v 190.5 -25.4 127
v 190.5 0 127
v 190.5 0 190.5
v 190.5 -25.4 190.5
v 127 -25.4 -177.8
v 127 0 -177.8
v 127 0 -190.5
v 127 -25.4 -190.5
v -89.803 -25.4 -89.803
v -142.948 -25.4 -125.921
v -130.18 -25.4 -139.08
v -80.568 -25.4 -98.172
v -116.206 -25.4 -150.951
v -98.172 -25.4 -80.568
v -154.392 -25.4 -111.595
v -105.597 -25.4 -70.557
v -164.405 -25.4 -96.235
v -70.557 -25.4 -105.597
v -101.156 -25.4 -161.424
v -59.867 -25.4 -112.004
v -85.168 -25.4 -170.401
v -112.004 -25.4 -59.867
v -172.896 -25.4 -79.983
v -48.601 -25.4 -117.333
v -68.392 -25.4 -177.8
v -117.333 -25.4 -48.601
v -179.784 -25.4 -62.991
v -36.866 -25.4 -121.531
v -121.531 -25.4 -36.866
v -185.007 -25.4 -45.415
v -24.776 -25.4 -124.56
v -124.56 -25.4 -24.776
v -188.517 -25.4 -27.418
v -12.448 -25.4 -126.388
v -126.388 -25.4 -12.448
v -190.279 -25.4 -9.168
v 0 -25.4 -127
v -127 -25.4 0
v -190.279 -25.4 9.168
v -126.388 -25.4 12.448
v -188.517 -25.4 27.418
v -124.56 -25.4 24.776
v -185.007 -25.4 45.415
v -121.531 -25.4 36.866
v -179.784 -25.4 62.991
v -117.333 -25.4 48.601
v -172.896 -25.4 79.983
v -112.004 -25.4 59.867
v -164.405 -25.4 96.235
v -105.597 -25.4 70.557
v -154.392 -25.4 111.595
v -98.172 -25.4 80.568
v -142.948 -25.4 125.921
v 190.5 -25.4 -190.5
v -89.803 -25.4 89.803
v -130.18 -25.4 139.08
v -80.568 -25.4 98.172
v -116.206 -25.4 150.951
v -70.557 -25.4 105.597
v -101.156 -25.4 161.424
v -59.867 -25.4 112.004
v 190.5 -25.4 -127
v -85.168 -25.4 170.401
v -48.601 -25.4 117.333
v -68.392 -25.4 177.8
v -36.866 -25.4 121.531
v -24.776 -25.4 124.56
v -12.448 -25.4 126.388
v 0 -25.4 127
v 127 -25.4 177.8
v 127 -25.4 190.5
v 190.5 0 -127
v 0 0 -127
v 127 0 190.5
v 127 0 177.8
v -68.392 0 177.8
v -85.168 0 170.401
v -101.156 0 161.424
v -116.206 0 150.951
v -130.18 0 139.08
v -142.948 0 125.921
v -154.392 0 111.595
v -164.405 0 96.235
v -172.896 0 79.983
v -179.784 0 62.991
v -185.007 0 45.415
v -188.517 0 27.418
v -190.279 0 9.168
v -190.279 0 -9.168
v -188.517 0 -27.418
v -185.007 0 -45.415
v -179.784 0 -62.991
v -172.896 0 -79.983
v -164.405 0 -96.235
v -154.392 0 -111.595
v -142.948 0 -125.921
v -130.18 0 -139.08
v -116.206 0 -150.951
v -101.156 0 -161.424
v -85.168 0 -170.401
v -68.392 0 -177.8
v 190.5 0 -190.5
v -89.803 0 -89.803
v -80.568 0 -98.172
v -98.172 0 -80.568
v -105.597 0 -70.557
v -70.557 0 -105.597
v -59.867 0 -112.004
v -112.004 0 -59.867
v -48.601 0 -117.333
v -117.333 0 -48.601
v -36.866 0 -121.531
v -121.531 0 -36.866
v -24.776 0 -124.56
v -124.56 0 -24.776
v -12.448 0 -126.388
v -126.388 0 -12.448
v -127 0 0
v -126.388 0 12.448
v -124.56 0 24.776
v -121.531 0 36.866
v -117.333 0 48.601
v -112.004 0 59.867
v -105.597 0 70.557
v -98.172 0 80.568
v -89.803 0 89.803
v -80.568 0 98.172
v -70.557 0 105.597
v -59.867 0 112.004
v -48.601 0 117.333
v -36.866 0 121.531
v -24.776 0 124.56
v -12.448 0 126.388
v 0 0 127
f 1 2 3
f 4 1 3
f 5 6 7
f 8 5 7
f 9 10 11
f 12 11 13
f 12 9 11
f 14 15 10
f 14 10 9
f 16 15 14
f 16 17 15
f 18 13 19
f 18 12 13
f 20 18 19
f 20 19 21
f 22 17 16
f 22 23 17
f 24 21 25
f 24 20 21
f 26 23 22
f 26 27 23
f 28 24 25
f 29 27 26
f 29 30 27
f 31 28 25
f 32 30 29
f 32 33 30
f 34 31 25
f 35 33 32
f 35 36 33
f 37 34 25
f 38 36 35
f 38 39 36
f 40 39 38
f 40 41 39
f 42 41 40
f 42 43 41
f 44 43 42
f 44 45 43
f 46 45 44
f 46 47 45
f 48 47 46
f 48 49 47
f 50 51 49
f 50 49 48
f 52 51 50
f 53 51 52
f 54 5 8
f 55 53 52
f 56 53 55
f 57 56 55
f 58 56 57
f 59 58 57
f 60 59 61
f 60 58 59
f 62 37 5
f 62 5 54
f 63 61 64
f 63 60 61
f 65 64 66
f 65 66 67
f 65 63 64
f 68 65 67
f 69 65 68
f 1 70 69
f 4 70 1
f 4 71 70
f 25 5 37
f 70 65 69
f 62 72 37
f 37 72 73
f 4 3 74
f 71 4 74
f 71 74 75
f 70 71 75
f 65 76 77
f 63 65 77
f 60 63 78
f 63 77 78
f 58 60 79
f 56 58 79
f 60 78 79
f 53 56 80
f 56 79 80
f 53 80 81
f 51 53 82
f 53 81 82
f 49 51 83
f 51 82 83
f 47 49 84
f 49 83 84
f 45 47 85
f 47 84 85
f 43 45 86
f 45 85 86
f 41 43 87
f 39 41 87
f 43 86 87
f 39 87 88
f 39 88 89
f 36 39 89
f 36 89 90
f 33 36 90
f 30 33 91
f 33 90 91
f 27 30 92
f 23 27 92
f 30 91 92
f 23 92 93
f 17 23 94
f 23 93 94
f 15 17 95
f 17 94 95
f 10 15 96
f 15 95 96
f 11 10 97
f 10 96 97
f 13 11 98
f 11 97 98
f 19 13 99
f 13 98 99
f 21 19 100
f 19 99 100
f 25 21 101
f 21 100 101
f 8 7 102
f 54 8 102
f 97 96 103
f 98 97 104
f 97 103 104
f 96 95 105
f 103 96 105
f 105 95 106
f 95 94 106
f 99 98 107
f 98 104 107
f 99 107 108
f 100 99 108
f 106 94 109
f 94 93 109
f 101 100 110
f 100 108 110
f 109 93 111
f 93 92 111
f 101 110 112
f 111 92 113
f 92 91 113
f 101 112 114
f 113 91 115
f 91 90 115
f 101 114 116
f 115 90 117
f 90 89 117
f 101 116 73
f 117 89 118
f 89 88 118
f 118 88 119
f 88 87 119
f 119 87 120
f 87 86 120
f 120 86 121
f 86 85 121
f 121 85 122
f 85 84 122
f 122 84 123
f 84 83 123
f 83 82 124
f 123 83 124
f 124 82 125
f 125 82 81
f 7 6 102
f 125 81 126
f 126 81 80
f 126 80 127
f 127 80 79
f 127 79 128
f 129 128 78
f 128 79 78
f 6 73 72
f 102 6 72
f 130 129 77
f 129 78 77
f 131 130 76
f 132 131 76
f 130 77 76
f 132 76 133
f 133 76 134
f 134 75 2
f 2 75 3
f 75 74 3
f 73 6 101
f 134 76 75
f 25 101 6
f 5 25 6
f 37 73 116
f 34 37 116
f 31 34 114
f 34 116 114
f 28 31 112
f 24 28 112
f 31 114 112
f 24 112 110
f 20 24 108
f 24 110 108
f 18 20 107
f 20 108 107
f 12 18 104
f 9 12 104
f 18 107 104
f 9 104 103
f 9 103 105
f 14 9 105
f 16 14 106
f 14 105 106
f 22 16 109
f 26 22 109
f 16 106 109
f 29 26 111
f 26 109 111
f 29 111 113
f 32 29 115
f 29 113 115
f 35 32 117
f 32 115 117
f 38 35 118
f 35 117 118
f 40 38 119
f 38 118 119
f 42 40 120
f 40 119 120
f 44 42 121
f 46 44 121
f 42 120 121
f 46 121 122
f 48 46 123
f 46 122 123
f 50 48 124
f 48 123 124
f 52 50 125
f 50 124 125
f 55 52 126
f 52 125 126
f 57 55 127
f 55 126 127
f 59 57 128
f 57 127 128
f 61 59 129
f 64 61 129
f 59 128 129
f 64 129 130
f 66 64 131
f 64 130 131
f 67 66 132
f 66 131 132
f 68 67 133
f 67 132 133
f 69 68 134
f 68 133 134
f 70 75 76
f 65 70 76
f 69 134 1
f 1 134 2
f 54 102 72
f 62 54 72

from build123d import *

# Parameters (mm, degrees)
F1_DEPTH = 25.4


with BuildPart() as f1:
    # F0 (on Front) → F1 (new body)
    with BuildSketch(Plane.XZ):
        with BuildLine():
            Line((-68.391593, -177.8), (127, -177.8))
            Line((127, -177.8), (127, -190.5))
            Line((127, -190.5), (190.5, -190.5))
            Line((190.5, -190.5), (190.5, -177.8))
            Line((190.5, -177.8), (190.5, -127))
            Line((190.5, -127), (127, -127))
            Line((127, -127), (0, -127))
            ThreePointArc((0, -127), (-127, 0), (0, 127))
            Line((0, 127), (127, 127))
            Line((127, 127), (190.5, 127))
            Line((190.5, 127), (190.5, 177.8))
            Line((190.5, 177.8), (190.5, 190.5))
            Line((190.5, 190.5), (127, 190.5))
            Line((127, 190.5), (127, 177.8))
            Line((127, 177.8), (-68.391593, 177.8))
            ThreePointArc((-68.391593, 177.8), (-190.5, 0), (-68.391593, -177.8))
        make_face()
    extrude(amount=F1_DEPTH)


solid = f1.part
